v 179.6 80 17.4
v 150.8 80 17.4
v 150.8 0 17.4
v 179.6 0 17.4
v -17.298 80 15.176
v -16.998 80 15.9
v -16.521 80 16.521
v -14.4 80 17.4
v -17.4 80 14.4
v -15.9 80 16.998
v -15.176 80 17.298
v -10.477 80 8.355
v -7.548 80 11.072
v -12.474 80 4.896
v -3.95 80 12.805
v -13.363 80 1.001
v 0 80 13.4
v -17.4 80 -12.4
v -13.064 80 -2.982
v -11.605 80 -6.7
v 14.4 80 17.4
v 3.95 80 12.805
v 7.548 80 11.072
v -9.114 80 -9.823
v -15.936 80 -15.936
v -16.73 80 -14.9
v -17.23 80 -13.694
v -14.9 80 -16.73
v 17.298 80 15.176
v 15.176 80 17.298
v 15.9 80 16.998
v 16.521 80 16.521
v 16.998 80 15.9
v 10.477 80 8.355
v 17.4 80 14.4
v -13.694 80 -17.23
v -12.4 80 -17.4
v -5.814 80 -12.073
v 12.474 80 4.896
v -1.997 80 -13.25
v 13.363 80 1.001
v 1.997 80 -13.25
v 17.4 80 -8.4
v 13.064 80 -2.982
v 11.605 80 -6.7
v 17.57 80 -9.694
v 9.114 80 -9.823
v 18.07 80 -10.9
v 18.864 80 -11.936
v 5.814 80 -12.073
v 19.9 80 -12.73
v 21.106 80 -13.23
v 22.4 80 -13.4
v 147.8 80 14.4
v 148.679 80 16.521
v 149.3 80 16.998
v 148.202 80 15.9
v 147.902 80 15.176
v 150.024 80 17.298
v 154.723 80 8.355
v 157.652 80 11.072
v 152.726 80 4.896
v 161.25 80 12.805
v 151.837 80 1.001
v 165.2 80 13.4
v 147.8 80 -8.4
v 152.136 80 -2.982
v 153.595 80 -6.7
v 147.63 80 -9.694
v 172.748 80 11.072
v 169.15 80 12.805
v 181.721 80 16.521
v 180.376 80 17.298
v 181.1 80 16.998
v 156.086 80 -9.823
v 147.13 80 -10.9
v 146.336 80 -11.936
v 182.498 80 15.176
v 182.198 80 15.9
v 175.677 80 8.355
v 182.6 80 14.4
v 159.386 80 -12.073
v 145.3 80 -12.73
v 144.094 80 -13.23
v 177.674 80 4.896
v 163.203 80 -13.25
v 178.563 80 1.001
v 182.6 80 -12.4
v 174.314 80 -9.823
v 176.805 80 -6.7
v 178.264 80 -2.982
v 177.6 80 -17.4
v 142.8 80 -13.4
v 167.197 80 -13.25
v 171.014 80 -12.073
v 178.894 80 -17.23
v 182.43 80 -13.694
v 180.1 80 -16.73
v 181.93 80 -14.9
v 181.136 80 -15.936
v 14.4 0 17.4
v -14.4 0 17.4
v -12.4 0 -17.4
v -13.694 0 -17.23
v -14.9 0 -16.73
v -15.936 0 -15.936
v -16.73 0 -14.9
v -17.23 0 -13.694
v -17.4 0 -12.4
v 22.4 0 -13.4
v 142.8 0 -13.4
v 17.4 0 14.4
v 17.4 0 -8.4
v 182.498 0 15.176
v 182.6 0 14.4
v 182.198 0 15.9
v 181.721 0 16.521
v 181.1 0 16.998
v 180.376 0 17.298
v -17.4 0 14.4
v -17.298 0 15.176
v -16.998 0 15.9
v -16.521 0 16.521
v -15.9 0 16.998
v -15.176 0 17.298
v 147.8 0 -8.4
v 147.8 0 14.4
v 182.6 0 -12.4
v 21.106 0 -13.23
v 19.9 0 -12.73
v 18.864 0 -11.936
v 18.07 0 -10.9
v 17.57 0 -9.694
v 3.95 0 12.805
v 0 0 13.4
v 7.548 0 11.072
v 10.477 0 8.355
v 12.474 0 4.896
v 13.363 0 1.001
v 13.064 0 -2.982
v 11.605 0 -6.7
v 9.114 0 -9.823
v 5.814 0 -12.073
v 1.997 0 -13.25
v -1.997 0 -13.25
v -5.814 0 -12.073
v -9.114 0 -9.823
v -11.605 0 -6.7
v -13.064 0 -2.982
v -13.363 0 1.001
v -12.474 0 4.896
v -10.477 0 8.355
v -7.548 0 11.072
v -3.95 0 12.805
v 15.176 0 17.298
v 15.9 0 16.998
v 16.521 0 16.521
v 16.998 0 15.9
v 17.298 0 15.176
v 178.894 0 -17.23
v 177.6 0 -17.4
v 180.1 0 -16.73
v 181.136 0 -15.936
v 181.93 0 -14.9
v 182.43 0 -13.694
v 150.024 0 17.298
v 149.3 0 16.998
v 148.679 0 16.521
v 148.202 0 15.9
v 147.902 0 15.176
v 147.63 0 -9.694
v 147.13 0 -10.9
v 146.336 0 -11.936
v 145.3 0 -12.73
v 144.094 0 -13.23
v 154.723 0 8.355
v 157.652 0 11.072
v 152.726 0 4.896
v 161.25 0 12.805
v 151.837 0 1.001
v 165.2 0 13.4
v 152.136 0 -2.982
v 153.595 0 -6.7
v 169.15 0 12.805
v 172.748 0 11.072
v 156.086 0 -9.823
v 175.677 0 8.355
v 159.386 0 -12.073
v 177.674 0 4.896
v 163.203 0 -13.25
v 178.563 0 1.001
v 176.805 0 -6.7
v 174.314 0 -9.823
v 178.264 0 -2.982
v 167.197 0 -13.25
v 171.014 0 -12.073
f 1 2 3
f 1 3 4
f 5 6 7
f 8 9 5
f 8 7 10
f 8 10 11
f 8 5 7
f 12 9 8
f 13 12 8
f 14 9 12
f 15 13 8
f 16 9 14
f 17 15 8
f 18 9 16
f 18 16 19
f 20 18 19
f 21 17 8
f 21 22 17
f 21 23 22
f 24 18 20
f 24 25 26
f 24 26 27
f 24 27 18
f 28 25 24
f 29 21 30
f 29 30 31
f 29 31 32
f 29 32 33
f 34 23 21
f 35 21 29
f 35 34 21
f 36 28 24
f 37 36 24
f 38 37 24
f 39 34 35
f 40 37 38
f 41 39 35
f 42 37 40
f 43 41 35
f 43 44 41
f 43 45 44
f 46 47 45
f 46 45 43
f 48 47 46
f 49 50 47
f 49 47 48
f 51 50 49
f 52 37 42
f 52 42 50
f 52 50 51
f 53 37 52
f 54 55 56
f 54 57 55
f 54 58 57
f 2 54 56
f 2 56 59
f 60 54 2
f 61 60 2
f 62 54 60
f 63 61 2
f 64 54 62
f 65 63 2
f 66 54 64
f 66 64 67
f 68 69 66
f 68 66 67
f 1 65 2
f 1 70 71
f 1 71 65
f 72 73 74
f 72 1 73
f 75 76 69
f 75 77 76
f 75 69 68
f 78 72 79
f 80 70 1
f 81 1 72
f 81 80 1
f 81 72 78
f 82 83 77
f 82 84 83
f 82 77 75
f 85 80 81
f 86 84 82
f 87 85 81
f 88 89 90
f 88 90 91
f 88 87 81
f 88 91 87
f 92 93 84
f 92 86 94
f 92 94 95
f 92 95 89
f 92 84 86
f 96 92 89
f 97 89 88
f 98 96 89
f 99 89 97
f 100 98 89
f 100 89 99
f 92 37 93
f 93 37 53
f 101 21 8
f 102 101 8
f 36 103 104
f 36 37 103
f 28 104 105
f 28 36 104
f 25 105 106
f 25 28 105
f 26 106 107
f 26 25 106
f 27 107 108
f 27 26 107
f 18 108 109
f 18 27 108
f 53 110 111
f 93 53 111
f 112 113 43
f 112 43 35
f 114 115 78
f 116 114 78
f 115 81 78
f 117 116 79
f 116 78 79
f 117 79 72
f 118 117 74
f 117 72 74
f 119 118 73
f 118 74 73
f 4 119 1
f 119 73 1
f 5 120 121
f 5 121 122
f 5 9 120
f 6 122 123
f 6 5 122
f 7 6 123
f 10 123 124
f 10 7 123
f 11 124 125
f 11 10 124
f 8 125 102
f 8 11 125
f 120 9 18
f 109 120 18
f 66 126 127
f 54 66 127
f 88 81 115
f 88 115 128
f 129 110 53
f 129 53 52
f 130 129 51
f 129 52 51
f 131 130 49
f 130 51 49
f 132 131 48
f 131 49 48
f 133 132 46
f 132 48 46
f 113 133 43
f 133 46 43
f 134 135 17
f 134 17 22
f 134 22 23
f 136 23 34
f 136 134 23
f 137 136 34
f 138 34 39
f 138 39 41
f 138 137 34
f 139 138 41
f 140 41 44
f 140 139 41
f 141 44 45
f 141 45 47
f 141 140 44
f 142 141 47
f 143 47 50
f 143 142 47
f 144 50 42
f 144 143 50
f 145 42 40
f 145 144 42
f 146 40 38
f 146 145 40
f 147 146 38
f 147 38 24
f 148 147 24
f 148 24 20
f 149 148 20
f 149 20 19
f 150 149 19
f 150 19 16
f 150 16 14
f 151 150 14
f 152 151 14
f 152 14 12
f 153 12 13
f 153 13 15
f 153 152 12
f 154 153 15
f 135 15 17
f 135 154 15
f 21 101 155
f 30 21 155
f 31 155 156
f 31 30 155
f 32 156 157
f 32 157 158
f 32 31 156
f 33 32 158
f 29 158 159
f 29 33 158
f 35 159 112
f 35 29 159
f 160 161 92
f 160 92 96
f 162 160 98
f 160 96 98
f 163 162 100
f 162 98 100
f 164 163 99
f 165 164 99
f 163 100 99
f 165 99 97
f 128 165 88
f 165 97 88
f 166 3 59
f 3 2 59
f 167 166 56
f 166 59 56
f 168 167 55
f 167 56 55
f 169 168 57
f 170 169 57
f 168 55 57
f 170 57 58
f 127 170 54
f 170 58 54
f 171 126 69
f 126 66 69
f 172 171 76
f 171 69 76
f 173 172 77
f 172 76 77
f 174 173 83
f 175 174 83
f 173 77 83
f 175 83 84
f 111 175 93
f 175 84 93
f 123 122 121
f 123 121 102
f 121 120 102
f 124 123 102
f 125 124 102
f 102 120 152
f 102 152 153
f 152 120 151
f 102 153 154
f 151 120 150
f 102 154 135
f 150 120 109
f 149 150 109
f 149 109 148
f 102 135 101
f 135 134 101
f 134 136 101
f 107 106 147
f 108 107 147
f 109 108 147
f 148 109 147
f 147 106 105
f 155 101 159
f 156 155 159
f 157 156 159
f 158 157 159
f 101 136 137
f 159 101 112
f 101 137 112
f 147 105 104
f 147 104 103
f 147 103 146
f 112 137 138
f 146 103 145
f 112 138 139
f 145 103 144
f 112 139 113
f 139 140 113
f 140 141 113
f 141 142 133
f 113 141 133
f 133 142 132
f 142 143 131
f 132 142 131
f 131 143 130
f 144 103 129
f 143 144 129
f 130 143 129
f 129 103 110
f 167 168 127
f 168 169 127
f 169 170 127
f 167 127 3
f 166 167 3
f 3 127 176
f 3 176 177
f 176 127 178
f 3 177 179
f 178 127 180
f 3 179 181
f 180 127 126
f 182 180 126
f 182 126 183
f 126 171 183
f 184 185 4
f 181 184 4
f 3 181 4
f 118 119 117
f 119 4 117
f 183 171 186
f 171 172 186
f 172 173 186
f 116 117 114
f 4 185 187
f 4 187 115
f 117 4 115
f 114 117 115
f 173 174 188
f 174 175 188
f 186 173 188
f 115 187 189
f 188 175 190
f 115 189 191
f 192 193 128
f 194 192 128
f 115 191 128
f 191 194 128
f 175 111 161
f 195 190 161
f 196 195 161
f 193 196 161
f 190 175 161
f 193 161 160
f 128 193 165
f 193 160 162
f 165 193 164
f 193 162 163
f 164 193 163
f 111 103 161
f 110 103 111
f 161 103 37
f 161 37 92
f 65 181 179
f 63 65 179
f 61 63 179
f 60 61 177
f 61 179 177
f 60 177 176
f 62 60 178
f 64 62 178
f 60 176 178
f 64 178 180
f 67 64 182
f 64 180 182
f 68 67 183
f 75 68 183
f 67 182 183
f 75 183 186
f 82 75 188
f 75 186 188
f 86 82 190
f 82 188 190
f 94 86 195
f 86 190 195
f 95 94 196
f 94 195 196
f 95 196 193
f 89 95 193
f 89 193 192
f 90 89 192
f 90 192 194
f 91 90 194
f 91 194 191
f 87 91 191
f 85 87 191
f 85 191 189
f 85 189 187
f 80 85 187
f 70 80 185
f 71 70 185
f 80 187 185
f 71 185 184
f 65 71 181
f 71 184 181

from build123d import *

# Parameters (mm, degrees)
SKETCH1_R           = 13.4
BOSS_EXTRUDE1_DEPTH = 80
FILLET1_R           = 5
FILLET2_R           = 3


with BuildPart() as part:
    # Sketch1 → Boss-Extrude1 (new body)
    with BuildSketch(Plane(origin=(0, 0, 0), x_dir=(1, 0, 0), z_dir=(0, 1, 0))):
        Polygon((-17.4, 17.4), (17.4, 17.4), (82.6, 17.4), (82.6, 13.4), (17.4, 13.4), (17.4, -17.4), (-17.4, -17.4), align=None)
        with Locations(Location((0, 0, 0), (0, 0, 270))):
            Circle(SKETCH1_R, mode=Mode.SUBTRACT)
    boss_extrude1 = extrude(amount=BOSS_EXTRUDE1_DEPTH)

    # Mirror3: Boss-Extrude1 across plane
    add(boss_extrude1.mirror(Plane(origin=(82.6, 80, 0), x_dir=(0, 0, 1), z_dir=(1, 0, 0))))

    # Fillet1
    fillet1_edges = [part.edges().sort_by_distance(p)[0] for p in [
        (17.4, 40, -13.4),
        (-17.4, 40, -17.4),
        (147.8, 40, -13.4),
        (182.6, 40, -17.4),
    ]]
    fillet(fillet1_edges, radius=FILLET1_R)

    # Fillet2
    fillet2_edges = [part.edges().sort_by_distance(p)[0] for p in [
        (17.4, 40, 17.4),
        (-17.4, 40, 17.4),
        (147.8, 40, 17.4),
        (182.6, 40, 17.4),
    ]]
    fillet(fillet2_edges, radius=FILLET2_R)


solid = part.part
